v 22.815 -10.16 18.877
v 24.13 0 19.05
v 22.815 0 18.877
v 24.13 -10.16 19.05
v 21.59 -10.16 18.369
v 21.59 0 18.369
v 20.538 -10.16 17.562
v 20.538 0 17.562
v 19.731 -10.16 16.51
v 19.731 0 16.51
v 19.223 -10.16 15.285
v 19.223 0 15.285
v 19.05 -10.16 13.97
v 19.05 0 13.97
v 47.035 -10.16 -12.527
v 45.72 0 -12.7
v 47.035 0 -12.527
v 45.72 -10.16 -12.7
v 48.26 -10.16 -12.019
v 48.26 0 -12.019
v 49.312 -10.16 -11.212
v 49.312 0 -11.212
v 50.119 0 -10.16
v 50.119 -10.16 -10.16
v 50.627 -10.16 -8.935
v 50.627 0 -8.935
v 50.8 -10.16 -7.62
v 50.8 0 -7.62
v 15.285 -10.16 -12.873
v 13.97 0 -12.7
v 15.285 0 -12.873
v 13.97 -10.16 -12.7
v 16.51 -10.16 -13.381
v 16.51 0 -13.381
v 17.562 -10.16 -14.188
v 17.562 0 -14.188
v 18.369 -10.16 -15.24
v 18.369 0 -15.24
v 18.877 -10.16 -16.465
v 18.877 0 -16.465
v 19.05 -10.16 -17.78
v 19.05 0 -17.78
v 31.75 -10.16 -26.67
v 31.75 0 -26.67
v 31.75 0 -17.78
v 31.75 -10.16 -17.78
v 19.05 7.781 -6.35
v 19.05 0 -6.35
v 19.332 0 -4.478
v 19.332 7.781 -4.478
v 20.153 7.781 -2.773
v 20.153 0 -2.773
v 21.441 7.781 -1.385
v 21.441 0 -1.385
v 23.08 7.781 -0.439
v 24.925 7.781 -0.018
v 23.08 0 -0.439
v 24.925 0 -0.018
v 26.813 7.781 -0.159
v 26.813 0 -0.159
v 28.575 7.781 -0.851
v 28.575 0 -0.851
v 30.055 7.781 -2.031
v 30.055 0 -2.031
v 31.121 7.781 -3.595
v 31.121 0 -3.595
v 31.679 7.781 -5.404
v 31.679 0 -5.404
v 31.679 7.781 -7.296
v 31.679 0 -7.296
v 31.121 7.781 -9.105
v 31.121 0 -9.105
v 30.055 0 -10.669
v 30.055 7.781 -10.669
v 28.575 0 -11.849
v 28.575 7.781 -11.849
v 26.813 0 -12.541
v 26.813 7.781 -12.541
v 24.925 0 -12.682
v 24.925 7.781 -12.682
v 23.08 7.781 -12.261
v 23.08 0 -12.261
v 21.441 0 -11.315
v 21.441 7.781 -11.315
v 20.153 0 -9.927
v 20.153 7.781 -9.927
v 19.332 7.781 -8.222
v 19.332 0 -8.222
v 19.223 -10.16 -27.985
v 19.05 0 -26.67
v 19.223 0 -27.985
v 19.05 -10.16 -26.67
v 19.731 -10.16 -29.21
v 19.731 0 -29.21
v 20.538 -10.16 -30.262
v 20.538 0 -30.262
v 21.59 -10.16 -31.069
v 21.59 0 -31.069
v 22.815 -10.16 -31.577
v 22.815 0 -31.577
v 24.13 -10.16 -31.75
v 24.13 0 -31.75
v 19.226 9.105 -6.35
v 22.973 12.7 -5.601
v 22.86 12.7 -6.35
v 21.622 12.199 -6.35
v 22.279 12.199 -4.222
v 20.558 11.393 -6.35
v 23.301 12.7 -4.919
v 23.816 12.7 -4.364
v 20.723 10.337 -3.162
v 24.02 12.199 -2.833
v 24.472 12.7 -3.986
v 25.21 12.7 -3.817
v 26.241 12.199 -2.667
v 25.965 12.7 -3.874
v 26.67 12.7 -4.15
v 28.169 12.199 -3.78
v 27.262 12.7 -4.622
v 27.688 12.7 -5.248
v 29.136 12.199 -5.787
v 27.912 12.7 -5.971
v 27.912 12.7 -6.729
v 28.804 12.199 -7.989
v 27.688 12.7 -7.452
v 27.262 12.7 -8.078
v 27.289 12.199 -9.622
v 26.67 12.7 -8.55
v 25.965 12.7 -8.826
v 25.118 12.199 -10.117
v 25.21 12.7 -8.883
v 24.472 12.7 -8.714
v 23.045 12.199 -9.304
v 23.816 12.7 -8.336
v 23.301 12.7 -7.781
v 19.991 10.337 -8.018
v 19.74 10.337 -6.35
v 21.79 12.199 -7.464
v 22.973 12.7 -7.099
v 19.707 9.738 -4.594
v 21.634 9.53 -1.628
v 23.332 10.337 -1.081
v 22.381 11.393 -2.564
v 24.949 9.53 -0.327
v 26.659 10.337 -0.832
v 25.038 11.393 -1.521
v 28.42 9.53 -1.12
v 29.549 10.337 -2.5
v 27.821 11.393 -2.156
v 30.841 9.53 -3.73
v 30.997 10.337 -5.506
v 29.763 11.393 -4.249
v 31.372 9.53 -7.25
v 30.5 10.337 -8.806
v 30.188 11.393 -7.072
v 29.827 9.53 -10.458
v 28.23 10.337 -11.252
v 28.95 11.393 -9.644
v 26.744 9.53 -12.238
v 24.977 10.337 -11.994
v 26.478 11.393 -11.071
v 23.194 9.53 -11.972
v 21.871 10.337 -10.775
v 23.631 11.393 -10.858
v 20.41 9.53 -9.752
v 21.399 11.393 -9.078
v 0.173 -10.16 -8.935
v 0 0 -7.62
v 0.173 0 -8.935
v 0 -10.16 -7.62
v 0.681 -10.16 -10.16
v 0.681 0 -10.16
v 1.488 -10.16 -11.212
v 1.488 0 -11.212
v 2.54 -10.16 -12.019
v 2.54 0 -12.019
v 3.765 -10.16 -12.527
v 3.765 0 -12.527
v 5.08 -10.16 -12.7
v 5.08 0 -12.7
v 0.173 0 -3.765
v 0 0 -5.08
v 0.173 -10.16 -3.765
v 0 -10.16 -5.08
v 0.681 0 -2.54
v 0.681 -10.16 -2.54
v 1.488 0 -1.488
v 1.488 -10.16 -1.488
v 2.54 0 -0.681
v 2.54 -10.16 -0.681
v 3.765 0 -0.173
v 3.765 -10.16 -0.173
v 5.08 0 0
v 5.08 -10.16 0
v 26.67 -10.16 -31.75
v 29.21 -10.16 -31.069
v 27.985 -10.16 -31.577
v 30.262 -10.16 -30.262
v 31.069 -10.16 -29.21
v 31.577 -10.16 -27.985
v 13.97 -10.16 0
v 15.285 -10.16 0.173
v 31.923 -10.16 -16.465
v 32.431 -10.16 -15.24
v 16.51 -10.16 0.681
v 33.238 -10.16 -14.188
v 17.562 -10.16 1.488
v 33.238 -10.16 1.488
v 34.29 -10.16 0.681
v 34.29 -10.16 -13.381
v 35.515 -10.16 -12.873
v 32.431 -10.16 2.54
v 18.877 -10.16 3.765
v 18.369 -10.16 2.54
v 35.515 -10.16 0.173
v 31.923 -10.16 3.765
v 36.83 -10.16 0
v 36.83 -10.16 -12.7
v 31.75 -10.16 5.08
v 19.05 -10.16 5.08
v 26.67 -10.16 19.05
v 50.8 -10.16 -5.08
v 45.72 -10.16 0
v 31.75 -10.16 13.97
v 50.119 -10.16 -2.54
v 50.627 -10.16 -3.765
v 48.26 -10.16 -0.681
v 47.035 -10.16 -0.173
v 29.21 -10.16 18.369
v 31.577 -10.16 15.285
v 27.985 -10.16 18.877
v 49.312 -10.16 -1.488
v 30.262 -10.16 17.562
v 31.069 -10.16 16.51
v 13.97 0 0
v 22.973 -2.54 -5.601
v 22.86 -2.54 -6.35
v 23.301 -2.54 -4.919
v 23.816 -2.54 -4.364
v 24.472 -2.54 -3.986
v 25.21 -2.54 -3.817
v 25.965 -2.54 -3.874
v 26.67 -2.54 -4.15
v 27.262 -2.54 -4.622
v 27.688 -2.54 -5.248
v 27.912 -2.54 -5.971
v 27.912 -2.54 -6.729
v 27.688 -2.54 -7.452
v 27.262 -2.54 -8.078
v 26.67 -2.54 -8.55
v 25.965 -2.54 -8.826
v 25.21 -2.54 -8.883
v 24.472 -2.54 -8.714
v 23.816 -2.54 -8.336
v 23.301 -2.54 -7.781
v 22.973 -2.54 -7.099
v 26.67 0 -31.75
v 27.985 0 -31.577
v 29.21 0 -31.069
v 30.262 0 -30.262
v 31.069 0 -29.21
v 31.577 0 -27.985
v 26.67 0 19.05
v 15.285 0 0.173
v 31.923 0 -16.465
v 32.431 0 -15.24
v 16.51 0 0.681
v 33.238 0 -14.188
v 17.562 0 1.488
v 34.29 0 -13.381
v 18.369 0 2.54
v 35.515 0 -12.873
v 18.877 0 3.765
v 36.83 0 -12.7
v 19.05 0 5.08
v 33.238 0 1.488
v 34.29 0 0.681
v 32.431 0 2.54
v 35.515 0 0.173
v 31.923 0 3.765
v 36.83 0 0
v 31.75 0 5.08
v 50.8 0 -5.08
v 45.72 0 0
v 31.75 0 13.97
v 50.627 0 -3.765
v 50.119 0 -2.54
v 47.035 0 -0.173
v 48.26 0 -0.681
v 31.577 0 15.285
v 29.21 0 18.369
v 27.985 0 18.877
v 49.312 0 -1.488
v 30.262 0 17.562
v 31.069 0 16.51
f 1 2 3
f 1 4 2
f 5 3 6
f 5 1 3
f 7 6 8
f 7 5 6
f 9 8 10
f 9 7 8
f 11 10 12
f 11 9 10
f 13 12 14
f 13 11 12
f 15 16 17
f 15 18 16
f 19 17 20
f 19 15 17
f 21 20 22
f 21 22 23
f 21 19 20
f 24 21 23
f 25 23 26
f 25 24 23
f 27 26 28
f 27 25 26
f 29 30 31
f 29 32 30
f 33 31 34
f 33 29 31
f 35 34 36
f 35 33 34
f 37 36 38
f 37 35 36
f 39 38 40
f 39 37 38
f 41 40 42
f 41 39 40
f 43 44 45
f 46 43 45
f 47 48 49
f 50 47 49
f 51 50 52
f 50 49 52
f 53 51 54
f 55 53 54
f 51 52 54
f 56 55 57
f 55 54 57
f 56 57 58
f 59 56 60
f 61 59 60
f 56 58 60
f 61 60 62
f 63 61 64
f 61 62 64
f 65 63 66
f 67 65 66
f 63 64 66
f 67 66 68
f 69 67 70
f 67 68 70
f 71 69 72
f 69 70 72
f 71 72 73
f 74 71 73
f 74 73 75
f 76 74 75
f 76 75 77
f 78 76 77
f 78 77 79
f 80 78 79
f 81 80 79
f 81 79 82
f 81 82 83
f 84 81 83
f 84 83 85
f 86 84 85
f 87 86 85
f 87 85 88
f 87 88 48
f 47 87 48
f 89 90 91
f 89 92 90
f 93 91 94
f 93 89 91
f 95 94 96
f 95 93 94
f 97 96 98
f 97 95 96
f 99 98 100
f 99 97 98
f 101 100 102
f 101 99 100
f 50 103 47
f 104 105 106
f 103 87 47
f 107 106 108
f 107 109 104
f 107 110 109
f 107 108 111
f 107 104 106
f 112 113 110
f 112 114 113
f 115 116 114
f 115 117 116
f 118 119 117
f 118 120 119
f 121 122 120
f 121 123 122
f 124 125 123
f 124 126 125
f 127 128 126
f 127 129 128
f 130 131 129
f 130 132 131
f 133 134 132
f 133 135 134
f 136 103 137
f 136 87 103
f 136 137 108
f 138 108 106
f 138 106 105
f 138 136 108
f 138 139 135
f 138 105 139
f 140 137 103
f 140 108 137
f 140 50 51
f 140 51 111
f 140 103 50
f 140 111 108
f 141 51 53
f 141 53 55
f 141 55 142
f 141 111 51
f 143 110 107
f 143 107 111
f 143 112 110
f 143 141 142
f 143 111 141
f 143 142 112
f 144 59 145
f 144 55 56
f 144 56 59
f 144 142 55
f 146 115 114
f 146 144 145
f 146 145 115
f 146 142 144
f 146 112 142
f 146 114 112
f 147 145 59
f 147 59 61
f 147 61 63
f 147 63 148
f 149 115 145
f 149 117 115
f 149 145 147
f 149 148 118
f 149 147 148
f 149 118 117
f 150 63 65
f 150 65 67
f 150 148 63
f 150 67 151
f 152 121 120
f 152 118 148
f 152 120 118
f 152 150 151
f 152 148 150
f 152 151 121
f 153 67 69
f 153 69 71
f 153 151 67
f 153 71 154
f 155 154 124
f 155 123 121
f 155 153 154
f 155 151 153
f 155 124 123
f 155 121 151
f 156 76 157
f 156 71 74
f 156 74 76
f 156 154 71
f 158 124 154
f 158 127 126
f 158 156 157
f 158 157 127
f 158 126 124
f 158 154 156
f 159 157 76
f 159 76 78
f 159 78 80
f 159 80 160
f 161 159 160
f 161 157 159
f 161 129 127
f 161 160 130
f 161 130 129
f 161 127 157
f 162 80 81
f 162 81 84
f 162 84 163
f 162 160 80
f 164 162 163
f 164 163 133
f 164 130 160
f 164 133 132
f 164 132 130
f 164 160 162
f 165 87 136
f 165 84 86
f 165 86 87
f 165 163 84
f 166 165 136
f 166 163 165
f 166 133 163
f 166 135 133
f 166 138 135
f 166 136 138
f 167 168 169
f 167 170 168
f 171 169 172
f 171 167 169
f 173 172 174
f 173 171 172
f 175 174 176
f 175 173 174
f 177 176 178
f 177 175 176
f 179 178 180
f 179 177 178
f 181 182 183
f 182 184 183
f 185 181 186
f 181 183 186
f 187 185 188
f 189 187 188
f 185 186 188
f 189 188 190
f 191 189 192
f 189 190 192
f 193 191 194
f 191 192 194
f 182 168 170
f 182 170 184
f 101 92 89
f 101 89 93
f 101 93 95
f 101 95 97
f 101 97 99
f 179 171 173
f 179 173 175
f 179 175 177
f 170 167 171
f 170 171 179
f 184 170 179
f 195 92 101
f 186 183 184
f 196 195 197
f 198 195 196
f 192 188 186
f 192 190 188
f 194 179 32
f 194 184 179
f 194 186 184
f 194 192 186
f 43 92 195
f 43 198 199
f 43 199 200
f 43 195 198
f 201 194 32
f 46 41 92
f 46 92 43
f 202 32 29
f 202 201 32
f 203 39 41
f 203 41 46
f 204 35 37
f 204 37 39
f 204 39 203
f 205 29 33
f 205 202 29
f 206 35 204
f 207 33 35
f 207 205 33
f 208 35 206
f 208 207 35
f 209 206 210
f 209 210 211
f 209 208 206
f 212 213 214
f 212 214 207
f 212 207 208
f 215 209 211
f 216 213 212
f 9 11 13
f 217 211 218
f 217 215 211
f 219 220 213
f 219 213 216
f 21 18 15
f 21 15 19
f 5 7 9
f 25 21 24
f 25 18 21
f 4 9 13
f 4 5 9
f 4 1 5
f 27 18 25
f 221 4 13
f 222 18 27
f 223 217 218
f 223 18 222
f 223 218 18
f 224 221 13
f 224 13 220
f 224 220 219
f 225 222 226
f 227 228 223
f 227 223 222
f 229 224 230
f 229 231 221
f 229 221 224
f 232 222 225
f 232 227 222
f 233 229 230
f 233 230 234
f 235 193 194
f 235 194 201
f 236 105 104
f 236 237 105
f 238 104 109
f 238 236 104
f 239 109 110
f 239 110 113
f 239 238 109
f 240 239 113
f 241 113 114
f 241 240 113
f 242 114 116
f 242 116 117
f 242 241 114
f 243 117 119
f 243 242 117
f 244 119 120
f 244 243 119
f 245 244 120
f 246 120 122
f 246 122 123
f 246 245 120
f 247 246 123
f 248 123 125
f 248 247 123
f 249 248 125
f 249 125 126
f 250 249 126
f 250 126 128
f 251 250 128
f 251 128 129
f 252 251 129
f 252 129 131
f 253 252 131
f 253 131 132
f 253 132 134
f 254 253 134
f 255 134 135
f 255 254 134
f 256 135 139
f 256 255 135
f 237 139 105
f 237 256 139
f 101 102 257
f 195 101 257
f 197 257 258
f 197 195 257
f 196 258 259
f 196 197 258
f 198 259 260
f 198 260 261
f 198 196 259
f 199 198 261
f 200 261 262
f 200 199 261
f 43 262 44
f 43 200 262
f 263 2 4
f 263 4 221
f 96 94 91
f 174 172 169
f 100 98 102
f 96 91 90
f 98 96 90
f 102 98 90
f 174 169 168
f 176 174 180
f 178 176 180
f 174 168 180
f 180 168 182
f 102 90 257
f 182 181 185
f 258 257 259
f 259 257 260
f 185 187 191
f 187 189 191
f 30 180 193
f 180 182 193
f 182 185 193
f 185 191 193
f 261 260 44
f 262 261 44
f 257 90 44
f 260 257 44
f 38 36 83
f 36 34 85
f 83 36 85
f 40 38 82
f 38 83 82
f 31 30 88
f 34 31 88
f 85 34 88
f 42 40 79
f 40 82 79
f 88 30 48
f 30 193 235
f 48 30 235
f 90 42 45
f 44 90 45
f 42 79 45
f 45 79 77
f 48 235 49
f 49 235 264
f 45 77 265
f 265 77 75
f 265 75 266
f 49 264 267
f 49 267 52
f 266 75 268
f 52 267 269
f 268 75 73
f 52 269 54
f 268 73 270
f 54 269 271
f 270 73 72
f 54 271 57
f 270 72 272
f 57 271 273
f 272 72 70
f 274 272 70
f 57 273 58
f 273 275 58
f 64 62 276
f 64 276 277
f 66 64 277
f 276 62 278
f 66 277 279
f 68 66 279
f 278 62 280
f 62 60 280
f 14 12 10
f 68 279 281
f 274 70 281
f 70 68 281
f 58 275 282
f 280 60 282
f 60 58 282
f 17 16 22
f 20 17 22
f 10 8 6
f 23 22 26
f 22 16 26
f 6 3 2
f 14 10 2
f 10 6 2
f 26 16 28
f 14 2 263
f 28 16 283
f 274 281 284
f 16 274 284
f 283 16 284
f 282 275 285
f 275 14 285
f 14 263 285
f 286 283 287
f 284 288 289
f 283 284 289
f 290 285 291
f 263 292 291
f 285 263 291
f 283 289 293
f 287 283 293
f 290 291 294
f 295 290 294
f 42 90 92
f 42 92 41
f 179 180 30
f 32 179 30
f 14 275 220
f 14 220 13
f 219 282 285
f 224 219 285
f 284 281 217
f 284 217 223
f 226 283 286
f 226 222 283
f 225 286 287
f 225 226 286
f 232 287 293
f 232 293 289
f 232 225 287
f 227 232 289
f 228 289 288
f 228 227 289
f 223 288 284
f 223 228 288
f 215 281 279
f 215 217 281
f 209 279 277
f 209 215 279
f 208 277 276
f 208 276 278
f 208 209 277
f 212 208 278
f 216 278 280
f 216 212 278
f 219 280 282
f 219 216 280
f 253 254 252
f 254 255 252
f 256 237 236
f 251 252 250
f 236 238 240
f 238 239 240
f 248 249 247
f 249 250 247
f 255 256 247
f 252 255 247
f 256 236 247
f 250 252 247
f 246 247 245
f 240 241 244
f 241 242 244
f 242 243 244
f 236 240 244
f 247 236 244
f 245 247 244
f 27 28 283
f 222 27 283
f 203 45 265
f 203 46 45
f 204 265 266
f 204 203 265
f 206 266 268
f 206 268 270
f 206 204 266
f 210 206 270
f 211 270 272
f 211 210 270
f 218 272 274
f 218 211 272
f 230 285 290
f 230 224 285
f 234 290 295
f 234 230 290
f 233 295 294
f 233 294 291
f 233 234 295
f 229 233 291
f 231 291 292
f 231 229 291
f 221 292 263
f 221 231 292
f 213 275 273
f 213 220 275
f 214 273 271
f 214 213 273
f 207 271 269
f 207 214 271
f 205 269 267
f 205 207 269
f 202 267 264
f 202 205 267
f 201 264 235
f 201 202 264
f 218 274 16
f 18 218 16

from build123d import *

# Parameters (mm, degrees)
F0_W     = 19.05
F0_H     = 12.7
F0_W_2   = 12.7
F0_H_2   = 19.05
F1_DEPTH = 10.16
F2_R     = 5.08
F3_R     = 6.35
F3_R_2   = 2.54
F4_DEPTH = 12.7
F5_DEPTH = 2.54


# Not quite as in the source:
# - a fillet or chamfer that OpenCascade refuses, or shapes differently, is made with other operations: its cross-section is extruded or revolved along the edge and cut away or added


with BuildPart() as f1:
    # F0 (on Front) → F1 (new body)
    with BuildSketch(Plane.XZ):
        with Locations((9.525, -6.35)):
            Rectangle(F0_W, F0_H)
        with Locations((25.4, 9.525)):
            Rectangle(F0_W_2, F0_H_2)
        with Locations((25.4, -6.35)):
            Rectangle(F0_W_2, F0_H)
        with Locations((41.275, -6.35)):
            Rectangle(F0_W, F0_H)
        with Locations((25.4, -22.225)):
            Rectangle(F0_W_2, F0_H_2)
    extrude(amount=F1_DEPTH)

    # F2
    f2_edges = [f1.edges().sort_by_distance(p)[0] for p in [
        (19.05, -5.08, -12.7),
        (19.05, -5.08, 0),
        (31.75, -5.08, 0),
        (31.75, -5.08, -12.7),
        (0, -5.08, 0),
        (0, -5.08, -12.7),
        (19.05, -5.08, -31.75),
        (31.75, -5.08, -31.75),
        (50.8, -5.08, -12.7),
        (50.8, -5.08, 0),
        (31.75, -5.08, 19.05),
        (19.05, -5.08, 19.05),
    ]]
    fillet(f2_edges, radius=F2_R)

    # F3 (on face) → F4 (join)
    with BuildSketch(Plane(origin=(0, 0, 0), x_dir=(-1, 0, 0), z_dir=(0, 1, 0))):
        with Locations((-25.4, -6.35)):
            Circle(F3_R)
        with Locations((-25.4, -6.35)):
            Circle(F3_R_2, mode=Mode.SUBTRACT)
    extrude(amount=F4_DEPTH)

    # F5 (cut): a face of the model
    f5_faces = [f1.faces().sort_by_distance(p)[0] for p in [
        (25.4, 0, -6.35),
    ]]
    extrude(f5_faces, amount=-F5_DEPTH, mode=Mode.SUBTRACT)

    # F6: fillet of radius 5.08 on 1 edges, made by hand

    # F6_s1 → F6_t2 (revolve, cut)
    with BuildSketch(Plane.XY.offset(-6.35)):
        with BuildLine():
            ThreePointArc((19.05, 7.7813111503), (20.1139073716, 10.8921631237), (22.86, 12.7))
            Line((22.86, 12.7), (19.05, 12.7))
            Line((19.05, 12.7), (19.05, 7.7813111503))
        make_face()
    revolve(axis=Axis((25.4, 12.7, -6.35), (0, 1, 0)), mode=Mode.SUBTRACT)


solid = f1.part
